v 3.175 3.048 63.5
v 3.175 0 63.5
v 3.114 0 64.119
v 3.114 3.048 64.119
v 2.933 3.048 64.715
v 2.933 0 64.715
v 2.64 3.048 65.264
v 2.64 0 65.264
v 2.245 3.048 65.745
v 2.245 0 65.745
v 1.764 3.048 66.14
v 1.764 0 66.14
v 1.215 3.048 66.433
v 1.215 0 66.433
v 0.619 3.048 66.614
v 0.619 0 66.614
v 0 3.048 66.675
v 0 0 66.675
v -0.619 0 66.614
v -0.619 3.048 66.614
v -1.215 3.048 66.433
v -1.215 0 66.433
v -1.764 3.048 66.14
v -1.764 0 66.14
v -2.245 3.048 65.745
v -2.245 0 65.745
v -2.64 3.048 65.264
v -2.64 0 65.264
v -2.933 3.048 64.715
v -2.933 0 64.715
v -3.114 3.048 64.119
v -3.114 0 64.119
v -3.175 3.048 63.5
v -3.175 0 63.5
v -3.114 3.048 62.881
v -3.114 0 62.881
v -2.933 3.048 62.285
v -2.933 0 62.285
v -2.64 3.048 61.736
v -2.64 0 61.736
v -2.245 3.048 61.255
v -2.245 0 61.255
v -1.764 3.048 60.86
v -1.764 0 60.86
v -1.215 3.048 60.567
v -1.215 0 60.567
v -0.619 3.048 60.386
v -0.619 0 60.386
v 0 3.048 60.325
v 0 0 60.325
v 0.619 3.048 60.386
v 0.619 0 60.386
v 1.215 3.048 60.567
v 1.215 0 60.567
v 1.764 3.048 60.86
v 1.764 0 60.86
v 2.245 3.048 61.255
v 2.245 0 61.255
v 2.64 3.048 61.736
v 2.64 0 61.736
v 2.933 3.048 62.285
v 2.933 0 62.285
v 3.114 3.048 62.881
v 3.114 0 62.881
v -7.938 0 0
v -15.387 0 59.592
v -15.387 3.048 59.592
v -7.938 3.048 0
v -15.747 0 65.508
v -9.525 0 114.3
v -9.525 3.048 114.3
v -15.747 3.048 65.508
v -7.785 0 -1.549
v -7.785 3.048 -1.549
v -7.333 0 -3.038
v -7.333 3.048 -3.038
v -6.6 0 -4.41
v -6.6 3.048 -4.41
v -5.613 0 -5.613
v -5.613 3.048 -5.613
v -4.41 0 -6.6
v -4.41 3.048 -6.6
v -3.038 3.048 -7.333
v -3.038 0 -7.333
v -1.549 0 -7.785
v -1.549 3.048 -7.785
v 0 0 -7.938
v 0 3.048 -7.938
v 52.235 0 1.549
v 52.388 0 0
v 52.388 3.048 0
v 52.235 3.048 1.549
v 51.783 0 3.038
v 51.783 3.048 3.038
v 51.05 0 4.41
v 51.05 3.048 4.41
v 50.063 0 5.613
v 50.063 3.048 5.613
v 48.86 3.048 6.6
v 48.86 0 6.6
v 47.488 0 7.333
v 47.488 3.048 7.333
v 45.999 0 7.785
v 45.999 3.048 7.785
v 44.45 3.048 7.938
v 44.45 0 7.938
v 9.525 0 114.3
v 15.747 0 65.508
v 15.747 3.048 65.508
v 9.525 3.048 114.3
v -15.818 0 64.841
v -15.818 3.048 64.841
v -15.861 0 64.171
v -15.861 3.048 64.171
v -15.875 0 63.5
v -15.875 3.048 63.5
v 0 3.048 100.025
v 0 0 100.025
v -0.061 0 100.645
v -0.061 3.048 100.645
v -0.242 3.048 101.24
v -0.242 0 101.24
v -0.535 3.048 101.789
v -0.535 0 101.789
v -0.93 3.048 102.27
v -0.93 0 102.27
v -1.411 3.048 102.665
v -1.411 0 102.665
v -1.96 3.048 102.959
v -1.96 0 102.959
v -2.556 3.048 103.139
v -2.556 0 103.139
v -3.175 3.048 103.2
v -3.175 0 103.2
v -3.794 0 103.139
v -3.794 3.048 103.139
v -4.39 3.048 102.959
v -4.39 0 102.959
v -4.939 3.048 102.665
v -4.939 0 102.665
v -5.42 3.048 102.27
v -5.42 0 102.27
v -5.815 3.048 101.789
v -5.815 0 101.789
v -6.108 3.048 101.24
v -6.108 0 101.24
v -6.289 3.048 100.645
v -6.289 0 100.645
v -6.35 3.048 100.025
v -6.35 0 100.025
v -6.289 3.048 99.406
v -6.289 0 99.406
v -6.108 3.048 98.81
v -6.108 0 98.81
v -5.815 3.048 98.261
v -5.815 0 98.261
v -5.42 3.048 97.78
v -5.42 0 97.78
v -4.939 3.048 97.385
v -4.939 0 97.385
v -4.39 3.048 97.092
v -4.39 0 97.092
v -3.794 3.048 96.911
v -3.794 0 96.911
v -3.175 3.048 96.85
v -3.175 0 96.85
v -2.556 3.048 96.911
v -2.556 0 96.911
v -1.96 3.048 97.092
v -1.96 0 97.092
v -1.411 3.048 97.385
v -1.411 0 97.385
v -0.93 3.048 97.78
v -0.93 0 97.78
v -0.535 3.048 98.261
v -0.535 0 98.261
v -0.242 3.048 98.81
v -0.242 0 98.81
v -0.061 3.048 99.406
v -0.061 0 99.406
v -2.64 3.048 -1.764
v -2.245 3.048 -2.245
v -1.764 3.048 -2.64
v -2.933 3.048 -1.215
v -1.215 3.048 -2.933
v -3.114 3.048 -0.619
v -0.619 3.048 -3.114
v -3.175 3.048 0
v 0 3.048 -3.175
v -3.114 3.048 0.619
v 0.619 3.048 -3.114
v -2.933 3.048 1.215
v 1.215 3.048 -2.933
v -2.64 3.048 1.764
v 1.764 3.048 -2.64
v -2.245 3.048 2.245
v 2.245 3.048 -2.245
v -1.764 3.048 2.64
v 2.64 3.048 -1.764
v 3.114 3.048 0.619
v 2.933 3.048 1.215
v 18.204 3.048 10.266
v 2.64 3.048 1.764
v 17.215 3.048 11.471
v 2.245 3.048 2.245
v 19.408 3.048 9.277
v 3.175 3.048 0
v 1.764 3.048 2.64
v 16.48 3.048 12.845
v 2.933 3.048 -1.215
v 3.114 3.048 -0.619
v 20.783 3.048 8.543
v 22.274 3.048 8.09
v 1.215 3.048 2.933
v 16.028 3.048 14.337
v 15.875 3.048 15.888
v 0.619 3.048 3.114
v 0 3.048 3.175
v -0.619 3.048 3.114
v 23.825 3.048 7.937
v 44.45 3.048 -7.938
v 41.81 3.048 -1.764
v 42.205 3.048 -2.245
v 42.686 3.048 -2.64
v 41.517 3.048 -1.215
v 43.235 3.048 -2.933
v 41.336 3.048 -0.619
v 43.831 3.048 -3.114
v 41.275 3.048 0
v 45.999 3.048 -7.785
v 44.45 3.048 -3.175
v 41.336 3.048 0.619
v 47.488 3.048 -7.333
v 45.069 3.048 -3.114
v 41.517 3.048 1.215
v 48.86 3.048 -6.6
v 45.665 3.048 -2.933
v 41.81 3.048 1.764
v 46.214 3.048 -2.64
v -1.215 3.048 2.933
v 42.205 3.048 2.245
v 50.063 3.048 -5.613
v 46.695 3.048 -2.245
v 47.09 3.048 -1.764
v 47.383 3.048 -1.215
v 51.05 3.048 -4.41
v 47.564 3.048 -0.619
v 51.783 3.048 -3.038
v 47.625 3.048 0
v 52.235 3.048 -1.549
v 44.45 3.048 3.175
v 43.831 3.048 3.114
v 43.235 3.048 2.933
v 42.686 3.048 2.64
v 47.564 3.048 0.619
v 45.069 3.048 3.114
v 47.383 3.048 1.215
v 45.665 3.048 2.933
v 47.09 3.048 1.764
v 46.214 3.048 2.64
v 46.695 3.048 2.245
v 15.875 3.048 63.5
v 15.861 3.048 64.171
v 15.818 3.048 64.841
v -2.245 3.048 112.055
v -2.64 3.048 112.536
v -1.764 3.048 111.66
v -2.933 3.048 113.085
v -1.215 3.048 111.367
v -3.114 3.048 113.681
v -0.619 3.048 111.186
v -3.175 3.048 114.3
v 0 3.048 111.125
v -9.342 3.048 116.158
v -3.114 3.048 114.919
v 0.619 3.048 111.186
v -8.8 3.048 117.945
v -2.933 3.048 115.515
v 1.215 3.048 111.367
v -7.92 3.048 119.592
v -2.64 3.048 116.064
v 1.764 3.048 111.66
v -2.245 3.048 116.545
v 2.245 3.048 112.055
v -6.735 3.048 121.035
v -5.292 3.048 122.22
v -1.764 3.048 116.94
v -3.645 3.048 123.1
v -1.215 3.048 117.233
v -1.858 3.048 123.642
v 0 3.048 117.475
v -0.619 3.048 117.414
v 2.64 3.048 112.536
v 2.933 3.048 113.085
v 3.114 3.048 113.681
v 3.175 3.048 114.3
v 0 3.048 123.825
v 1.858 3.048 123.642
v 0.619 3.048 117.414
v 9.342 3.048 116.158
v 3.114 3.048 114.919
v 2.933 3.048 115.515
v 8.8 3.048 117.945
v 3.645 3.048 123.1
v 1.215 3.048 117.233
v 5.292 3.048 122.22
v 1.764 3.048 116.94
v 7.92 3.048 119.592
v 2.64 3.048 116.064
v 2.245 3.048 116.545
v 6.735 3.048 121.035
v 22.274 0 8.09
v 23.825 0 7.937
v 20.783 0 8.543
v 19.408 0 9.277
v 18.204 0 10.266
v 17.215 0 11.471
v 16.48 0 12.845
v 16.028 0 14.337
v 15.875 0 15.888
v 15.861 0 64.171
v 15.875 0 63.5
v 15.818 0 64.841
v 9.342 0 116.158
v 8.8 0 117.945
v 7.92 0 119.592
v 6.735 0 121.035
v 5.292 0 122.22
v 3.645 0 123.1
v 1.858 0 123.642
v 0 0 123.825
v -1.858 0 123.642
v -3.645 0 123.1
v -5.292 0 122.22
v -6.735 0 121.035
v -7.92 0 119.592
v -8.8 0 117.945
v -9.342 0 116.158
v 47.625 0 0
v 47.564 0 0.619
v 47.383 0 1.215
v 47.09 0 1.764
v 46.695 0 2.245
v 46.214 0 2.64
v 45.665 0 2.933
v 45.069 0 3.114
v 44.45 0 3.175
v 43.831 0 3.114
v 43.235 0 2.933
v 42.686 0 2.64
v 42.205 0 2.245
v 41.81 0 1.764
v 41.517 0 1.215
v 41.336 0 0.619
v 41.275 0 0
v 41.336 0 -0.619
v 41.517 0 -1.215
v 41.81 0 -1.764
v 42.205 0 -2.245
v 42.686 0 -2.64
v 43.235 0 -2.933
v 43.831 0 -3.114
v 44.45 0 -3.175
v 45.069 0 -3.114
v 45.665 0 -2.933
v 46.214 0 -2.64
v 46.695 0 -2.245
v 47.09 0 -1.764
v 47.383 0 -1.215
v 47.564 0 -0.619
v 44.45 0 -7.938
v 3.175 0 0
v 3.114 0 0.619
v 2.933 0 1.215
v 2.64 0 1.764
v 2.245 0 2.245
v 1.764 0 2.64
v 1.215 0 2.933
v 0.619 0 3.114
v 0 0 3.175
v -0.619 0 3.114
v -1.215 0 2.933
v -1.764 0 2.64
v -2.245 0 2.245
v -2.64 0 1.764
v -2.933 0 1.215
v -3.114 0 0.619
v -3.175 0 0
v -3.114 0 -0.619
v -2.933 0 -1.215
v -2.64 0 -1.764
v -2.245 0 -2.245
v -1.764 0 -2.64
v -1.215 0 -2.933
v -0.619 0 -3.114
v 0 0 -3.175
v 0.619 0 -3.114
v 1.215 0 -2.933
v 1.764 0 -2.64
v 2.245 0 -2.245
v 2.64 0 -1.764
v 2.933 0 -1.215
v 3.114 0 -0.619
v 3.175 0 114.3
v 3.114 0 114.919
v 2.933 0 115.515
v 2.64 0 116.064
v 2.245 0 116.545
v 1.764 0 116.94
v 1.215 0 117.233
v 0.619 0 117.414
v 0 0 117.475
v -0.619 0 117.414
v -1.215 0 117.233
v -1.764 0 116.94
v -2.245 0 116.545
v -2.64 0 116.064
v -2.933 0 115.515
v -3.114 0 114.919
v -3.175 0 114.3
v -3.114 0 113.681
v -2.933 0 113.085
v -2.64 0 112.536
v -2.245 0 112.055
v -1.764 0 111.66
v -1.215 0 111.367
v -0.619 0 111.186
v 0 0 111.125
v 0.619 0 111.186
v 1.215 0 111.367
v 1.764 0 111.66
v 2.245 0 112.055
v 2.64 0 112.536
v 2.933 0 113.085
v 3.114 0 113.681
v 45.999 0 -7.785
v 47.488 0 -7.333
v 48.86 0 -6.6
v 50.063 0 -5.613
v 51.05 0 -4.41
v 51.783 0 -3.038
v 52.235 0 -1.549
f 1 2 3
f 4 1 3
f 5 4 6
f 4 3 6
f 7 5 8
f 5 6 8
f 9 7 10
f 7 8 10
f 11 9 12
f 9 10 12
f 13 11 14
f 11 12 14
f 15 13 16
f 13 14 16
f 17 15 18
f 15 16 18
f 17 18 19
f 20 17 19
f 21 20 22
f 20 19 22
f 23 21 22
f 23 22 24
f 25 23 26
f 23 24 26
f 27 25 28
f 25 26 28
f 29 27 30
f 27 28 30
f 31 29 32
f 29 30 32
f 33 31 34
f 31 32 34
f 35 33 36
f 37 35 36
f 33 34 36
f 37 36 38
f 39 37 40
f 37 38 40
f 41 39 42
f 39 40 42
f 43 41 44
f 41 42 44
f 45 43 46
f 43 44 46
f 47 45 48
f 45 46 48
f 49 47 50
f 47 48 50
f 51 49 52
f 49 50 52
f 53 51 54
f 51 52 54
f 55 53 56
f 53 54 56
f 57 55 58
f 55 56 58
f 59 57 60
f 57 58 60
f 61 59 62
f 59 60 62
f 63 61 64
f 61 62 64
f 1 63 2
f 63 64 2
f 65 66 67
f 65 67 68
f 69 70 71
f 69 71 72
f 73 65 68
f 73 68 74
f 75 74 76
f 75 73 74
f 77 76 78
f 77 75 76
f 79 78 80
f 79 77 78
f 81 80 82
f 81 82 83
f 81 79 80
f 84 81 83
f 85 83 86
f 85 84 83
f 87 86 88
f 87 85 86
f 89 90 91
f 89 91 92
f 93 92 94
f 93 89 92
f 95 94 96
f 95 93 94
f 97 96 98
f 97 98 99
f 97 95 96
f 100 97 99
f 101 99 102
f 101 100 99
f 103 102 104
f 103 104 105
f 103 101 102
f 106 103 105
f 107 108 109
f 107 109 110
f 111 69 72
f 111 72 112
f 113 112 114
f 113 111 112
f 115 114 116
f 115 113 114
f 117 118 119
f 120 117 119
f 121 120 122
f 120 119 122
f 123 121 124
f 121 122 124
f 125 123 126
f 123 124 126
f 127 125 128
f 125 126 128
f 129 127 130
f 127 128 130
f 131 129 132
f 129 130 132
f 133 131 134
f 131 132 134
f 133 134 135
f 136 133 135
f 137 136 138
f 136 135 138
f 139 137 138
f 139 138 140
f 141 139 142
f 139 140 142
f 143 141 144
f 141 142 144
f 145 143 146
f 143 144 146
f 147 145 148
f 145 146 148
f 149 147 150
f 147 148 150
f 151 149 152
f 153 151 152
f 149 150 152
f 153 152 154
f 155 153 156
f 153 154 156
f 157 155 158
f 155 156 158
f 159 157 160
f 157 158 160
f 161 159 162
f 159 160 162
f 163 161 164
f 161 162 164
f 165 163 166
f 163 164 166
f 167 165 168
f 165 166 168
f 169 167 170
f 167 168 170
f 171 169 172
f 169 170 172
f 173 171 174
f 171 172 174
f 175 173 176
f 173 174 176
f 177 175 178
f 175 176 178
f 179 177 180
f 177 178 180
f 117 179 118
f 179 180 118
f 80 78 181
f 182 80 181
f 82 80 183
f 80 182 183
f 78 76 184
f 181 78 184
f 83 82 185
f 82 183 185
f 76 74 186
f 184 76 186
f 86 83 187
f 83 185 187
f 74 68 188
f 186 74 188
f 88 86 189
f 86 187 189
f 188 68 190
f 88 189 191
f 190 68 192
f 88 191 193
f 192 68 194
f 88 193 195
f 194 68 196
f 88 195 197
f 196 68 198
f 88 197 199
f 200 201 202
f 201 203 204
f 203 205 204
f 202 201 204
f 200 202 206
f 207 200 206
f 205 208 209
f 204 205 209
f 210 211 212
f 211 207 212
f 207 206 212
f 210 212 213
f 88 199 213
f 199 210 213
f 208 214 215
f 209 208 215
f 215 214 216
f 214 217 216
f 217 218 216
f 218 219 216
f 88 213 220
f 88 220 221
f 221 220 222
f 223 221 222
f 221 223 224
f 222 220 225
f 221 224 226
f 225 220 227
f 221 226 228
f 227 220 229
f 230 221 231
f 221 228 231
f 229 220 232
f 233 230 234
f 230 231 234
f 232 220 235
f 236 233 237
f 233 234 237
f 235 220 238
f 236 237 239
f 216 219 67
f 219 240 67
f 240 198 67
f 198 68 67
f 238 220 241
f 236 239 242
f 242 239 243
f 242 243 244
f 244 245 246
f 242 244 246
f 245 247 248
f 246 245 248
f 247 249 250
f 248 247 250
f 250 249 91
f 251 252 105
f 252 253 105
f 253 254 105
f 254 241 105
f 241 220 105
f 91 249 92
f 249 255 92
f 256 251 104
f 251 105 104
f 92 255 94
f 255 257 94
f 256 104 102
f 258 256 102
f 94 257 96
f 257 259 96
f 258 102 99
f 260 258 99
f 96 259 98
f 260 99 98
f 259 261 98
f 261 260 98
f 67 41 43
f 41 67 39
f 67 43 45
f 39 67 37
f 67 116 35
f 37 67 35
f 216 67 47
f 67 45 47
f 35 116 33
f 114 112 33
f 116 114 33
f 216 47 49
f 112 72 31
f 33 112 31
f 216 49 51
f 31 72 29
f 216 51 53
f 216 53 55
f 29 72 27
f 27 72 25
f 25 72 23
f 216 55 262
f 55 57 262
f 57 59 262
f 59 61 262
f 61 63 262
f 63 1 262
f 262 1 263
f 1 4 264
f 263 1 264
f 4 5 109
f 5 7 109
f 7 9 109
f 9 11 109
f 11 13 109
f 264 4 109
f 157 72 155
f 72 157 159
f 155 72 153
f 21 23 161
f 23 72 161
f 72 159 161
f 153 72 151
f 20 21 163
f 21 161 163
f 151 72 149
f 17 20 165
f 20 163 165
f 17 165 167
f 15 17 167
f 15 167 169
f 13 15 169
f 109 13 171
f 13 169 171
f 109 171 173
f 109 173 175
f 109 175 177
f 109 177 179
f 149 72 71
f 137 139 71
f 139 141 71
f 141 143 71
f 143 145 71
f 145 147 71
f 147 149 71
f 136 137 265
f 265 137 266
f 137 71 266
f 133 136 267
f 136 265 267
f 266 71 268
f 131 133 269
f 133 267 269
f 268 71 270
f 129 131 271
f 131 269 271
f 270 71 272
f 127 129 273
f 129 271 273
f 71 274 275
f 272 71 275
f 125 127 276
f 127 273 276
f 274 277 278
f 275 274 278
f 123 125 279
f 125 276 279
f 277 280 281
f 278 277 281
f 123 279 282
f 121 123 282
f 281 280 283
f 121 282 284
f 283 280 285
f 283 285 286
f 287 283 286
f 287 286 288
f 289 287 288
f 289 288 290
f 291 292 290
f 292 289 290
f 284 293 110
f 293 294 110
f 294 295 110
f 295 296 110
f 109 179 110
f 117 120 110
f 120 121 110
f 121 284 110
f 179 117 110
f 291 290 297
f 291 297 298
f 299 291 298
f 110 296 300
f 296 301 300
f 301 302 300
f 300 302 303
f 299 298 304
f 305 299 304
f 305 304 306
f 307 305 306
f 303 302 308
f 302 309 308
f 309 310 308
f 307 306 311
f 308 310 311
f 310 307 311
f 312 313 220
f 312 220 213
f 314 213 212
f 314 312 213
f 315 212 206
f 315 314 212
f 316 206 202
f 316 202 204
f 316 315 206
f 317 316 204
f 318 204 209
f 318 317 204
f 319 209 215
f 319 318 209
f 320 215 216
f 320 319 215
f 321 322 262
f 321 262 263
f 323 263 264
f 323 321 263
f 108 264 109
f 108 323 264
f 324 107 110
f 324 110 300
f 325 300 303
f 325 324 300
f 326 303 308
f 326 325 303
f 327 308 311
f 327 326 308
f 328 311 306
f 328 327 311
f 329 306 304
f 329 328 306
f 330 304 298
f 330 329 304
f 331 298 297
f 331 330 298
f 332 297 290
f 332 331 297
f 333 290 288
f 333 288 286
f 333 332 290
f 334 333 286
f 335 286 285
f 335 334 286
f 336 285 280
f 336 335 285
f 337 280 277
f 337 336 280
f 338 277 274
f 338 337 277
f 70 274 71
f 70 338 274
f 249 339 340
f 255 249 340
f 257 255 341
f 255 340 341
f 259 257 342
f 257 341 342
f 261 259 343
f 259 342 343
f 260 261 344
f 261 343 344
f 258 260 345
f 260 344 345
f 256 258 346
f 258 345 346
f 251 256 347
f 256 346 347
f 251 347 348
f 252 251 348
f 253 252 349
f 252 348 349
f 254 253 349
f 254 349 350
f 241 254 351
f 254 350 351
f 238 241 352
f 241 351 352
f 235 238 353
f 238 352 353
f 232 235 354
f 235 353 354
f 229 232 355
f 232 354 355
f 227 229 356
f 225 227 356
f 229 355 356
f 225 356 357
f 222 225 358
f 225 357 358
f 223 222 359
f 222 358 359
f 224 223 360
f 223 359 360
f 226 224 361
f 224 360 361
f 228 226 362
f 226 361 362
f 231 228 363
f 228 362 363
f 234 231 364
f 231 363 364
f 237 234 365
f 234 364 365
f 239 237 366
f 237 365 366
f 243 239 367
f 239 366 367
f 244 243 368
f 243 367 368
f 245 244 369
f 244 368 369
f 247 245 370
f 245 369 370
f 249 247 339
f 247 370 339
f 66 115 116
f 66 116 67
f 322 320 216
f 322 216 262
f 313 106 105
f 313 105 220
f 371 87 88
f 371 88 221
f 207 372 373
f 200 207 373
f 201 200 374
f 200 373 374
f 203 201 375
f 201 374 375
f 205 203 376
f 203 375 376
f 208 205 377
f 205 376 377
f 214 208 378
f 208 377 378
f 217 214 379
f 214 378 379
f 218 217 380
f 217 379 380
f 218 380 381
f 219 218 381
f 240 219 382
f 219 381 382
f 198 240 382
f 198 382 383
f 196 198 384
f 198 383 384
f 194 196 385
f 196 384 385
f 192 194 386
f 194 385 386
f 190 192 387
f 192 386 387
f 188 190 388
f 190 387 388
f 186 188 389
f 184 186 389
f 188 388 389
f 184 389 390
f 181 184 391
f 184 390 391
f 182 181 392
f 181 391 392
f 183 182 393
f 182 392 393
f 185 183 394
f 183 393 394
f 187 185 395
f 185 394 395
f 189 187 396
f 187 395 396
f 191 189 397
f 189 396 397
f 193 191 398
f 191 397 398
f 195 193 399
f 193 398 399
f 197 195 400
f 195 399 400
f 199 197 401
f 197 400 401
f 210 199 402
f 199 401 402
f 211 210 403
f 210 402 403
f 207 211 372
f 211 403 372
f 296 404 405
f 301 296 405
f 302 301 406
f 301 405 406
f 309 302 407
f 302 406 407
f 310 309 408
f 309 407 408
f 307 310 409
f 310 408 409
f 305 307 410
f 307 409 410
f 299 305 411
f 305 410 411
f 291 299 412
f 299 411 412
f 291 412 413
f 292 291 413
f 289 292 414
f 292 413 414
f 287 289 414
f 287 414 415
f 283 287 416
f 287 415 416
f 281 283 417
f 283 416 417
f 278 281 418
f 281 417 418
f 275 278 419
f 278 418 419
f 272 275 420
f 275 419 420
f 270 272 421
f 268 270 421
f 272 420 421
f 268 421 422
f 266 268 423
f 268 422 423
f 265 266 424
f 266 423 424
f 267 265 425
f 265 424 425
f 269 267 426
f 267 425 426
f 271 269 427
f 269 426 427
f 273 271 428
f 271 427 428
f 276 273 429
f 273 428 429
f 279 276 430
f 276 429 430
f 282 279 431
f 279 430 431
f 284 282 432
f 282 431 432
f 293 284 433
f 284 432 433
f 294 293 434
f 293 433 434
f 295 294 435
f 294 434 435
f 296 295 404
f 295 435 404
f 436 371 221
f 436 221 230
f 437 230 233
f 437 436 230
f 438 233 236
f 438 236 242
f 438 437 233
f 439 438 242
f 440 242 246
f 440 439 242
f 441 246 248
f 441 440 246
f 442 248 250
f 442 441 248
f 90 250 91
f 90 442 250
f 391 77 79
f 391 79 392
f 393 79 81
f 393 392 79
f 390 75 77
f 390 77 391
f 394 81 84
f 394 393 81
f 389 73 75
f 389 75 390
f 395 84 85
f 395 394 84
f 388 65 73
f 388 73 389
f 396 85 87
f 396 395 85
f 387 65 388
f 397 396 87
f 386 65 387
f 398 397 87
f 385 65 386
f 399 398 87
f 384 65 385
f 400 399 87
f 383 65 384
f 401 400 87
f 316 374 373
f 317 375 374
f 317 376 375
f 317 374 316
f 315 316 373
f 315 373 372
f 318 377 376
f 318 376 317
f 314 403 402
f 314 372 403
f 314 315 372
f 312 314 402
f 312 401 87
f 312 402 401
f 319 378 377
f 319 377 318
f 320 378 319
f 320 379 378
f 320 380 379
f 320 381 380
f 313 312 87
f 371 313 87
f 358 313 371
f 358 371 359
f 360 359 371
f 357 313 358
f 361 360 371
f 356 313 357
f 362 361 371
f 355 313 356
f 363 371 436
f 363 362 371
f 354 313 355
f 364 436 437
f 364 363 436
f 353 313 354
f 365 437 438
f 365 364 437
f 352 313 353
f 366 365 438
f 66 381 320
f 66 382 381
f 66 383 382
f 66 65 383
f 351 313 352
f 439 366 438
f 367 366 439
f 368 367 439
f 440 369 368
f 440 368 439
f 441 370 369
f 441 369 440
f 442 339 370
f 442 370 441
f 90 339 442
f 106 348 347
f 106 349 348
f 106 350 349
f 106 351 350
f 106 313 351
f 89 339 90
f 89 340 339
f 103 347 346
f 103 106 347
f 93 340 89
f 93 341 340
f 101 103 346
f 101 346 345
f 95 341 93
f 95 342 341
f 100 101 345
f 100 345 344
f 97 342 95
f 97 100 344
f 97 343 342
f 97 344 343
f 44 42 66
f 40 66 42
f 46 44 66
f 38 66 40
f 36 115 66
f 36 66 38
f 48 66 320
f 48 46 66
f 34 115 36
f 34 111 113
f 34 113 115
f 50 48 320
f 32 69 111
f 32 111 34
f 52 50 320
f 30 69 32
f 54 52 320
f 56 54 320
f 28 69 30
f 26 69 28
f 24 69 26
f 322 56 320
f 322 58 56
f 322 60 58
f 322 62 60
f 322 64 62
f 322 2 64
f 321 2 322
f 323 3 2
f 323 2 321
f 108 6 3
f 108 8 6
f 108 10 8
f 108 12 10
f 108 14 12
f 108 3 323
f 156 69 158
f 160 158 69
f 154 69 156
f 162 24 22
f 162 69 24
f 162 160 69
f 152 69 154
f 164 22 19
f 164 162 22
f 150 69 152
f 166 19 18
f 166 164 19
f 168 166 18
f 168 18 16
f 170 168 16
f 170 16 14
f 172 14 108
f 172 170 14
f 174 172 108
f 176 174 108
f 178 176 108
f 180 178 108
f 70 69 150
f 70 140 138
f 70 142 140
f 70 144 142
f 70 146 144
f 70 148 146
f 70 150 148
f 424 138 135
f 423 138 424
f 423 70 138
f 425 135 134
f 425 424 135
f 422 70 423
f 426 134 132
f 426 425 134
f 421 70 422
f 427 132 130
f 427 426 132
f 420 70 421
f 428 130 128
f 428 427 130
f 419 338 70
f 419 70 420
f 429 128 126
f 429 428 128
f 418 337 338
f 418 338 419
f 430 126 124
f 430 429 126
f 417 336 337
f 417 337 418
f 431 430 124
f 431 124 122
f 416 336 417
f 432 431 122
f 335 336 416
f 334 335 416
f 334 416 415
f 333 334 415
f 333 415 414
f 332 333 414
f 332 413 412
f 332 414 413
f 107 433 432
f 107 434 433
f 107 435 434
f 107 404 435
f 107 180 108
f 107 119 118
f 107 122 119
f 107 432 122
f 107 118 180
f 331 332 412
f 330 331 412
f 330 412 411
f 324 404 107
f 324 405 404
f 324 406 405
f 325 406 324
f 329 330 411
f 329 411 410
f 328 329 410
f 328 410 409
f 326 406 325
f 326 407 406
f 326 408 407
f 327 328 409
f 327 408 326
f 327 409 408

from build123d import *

# Parameters (mm, degrees)
F0_R     = 3.175
F1_DEPTH = 3.048


with BuildPart() as f1:
    # F0 (on Front) → F1 (new body)
    with BuildSketch(Plane.XZ):
        with BuildLine():
            ThreePointArc((-9.525, 114.3), (0, 104.775), (9.525, 114.3))
            ThreePointArc((9.525, 114.3), (0, 123.825), (-9.525, 114.3))
        make_face()
        with Locations((0, 114.3)):
            Circle(F0_R, mode=Mode.SUBTRACT)
        with BuildLine():
            ThreePointArc((-15.747457, 65.508289), (0, 79.375), (15.747457, 65.508289))
            Line((15.747457, 65.508289), (9.525, 114.3))
            ThreePointArc((9.525, 114.3), (0, 104.775), (-9.525, 114.3))
            Line((-9.525, 114.3), (-15.747457, 65.508289))
        make_face()
        with Locations((-3.175, 100.0252)):
            Circle(F0_R, mode=Mode.SUBTRACT)
        with BuildLine():
            ThreePointArc((-15.386538, 59.592308), (1.969051, 47.747589), (15.875, 63.5))
            ThreePointArc((15.875, 63.5), (15.843082, 64.506168), (15.747457, 65.508289))
            ThreePointArc((15.747457, 65.508289), (0, 79.375), (-15.747457, 65.508289))
            ThreePointArc((-15.747457, 65.508289), (-15.843082, 64.506168), (-15.875, 63.5))
            Line((-15.875, 63.5), (-15.386538, 59.592308))
        make_face()
        with Locations((0, 63.5)):
            Circle(F0_R, mode=Mode.SUBTRACT)
        with BuildLine():
            Line((15.875, 15.8877), (15.875, 63.5))
            ThreePointArc((15.875, 63.5), (1.969051, 47.747589), (-15.386538, 59.592308))
            Line((-15.386538, 59.592308), (-7.9375, 0))
            ThreePointArc((-7.9375, 0), (0, 7.9375), (7.9375, 0))
            ThreePointArc((7.9375, 0), (5.61266, -5.61266), (0, -7.9375))
            Line((0, -7.9375), (44.45, -7.9375))
            ThreePointArc((44.45, -7.9375), (36.5125, 0), (44.45, 7.9375))
            Line((44.45, 7.9375), (23.8252, 7.9375))
            ThreePointArc((23.8252, 7.9375), (18.20356, 10.26606), (15.875, 15.8877))
        make_face()
        with BuildLine():
            ThreePointArc((7.9375, 0), (0, 7.9375), (-7.9375, 0))
            ThreePointArc((-7.9375, 0), (-5.61266, -5.61266), (0, -7.9375))
            ThreePointArc((0, -7.9375), (5.61266, -5.61266), (7.9375, 0))
        make_face()
        Circle(F0_R, mode=Mode.SUBTRACT)
        with BuildLine():
            ThreePointArc((52.3875, 0), (50.06266, 5.61266), (44.45, 7.9375))
            ThreePointArc((44.45, 7.9375), (36.5125, 0), (44.45, -7.9375))
            ThreePointArc((44.45, -7.9375), (50.06266, -5.61266), (52.3875, 0))
        make_face()
        with Locations((44.45, 0)):
            Circle(F0_R, mode=Mode.SUBTRACT)
    extrude(amount=-F1_DEPTH)


solid = f1.part
